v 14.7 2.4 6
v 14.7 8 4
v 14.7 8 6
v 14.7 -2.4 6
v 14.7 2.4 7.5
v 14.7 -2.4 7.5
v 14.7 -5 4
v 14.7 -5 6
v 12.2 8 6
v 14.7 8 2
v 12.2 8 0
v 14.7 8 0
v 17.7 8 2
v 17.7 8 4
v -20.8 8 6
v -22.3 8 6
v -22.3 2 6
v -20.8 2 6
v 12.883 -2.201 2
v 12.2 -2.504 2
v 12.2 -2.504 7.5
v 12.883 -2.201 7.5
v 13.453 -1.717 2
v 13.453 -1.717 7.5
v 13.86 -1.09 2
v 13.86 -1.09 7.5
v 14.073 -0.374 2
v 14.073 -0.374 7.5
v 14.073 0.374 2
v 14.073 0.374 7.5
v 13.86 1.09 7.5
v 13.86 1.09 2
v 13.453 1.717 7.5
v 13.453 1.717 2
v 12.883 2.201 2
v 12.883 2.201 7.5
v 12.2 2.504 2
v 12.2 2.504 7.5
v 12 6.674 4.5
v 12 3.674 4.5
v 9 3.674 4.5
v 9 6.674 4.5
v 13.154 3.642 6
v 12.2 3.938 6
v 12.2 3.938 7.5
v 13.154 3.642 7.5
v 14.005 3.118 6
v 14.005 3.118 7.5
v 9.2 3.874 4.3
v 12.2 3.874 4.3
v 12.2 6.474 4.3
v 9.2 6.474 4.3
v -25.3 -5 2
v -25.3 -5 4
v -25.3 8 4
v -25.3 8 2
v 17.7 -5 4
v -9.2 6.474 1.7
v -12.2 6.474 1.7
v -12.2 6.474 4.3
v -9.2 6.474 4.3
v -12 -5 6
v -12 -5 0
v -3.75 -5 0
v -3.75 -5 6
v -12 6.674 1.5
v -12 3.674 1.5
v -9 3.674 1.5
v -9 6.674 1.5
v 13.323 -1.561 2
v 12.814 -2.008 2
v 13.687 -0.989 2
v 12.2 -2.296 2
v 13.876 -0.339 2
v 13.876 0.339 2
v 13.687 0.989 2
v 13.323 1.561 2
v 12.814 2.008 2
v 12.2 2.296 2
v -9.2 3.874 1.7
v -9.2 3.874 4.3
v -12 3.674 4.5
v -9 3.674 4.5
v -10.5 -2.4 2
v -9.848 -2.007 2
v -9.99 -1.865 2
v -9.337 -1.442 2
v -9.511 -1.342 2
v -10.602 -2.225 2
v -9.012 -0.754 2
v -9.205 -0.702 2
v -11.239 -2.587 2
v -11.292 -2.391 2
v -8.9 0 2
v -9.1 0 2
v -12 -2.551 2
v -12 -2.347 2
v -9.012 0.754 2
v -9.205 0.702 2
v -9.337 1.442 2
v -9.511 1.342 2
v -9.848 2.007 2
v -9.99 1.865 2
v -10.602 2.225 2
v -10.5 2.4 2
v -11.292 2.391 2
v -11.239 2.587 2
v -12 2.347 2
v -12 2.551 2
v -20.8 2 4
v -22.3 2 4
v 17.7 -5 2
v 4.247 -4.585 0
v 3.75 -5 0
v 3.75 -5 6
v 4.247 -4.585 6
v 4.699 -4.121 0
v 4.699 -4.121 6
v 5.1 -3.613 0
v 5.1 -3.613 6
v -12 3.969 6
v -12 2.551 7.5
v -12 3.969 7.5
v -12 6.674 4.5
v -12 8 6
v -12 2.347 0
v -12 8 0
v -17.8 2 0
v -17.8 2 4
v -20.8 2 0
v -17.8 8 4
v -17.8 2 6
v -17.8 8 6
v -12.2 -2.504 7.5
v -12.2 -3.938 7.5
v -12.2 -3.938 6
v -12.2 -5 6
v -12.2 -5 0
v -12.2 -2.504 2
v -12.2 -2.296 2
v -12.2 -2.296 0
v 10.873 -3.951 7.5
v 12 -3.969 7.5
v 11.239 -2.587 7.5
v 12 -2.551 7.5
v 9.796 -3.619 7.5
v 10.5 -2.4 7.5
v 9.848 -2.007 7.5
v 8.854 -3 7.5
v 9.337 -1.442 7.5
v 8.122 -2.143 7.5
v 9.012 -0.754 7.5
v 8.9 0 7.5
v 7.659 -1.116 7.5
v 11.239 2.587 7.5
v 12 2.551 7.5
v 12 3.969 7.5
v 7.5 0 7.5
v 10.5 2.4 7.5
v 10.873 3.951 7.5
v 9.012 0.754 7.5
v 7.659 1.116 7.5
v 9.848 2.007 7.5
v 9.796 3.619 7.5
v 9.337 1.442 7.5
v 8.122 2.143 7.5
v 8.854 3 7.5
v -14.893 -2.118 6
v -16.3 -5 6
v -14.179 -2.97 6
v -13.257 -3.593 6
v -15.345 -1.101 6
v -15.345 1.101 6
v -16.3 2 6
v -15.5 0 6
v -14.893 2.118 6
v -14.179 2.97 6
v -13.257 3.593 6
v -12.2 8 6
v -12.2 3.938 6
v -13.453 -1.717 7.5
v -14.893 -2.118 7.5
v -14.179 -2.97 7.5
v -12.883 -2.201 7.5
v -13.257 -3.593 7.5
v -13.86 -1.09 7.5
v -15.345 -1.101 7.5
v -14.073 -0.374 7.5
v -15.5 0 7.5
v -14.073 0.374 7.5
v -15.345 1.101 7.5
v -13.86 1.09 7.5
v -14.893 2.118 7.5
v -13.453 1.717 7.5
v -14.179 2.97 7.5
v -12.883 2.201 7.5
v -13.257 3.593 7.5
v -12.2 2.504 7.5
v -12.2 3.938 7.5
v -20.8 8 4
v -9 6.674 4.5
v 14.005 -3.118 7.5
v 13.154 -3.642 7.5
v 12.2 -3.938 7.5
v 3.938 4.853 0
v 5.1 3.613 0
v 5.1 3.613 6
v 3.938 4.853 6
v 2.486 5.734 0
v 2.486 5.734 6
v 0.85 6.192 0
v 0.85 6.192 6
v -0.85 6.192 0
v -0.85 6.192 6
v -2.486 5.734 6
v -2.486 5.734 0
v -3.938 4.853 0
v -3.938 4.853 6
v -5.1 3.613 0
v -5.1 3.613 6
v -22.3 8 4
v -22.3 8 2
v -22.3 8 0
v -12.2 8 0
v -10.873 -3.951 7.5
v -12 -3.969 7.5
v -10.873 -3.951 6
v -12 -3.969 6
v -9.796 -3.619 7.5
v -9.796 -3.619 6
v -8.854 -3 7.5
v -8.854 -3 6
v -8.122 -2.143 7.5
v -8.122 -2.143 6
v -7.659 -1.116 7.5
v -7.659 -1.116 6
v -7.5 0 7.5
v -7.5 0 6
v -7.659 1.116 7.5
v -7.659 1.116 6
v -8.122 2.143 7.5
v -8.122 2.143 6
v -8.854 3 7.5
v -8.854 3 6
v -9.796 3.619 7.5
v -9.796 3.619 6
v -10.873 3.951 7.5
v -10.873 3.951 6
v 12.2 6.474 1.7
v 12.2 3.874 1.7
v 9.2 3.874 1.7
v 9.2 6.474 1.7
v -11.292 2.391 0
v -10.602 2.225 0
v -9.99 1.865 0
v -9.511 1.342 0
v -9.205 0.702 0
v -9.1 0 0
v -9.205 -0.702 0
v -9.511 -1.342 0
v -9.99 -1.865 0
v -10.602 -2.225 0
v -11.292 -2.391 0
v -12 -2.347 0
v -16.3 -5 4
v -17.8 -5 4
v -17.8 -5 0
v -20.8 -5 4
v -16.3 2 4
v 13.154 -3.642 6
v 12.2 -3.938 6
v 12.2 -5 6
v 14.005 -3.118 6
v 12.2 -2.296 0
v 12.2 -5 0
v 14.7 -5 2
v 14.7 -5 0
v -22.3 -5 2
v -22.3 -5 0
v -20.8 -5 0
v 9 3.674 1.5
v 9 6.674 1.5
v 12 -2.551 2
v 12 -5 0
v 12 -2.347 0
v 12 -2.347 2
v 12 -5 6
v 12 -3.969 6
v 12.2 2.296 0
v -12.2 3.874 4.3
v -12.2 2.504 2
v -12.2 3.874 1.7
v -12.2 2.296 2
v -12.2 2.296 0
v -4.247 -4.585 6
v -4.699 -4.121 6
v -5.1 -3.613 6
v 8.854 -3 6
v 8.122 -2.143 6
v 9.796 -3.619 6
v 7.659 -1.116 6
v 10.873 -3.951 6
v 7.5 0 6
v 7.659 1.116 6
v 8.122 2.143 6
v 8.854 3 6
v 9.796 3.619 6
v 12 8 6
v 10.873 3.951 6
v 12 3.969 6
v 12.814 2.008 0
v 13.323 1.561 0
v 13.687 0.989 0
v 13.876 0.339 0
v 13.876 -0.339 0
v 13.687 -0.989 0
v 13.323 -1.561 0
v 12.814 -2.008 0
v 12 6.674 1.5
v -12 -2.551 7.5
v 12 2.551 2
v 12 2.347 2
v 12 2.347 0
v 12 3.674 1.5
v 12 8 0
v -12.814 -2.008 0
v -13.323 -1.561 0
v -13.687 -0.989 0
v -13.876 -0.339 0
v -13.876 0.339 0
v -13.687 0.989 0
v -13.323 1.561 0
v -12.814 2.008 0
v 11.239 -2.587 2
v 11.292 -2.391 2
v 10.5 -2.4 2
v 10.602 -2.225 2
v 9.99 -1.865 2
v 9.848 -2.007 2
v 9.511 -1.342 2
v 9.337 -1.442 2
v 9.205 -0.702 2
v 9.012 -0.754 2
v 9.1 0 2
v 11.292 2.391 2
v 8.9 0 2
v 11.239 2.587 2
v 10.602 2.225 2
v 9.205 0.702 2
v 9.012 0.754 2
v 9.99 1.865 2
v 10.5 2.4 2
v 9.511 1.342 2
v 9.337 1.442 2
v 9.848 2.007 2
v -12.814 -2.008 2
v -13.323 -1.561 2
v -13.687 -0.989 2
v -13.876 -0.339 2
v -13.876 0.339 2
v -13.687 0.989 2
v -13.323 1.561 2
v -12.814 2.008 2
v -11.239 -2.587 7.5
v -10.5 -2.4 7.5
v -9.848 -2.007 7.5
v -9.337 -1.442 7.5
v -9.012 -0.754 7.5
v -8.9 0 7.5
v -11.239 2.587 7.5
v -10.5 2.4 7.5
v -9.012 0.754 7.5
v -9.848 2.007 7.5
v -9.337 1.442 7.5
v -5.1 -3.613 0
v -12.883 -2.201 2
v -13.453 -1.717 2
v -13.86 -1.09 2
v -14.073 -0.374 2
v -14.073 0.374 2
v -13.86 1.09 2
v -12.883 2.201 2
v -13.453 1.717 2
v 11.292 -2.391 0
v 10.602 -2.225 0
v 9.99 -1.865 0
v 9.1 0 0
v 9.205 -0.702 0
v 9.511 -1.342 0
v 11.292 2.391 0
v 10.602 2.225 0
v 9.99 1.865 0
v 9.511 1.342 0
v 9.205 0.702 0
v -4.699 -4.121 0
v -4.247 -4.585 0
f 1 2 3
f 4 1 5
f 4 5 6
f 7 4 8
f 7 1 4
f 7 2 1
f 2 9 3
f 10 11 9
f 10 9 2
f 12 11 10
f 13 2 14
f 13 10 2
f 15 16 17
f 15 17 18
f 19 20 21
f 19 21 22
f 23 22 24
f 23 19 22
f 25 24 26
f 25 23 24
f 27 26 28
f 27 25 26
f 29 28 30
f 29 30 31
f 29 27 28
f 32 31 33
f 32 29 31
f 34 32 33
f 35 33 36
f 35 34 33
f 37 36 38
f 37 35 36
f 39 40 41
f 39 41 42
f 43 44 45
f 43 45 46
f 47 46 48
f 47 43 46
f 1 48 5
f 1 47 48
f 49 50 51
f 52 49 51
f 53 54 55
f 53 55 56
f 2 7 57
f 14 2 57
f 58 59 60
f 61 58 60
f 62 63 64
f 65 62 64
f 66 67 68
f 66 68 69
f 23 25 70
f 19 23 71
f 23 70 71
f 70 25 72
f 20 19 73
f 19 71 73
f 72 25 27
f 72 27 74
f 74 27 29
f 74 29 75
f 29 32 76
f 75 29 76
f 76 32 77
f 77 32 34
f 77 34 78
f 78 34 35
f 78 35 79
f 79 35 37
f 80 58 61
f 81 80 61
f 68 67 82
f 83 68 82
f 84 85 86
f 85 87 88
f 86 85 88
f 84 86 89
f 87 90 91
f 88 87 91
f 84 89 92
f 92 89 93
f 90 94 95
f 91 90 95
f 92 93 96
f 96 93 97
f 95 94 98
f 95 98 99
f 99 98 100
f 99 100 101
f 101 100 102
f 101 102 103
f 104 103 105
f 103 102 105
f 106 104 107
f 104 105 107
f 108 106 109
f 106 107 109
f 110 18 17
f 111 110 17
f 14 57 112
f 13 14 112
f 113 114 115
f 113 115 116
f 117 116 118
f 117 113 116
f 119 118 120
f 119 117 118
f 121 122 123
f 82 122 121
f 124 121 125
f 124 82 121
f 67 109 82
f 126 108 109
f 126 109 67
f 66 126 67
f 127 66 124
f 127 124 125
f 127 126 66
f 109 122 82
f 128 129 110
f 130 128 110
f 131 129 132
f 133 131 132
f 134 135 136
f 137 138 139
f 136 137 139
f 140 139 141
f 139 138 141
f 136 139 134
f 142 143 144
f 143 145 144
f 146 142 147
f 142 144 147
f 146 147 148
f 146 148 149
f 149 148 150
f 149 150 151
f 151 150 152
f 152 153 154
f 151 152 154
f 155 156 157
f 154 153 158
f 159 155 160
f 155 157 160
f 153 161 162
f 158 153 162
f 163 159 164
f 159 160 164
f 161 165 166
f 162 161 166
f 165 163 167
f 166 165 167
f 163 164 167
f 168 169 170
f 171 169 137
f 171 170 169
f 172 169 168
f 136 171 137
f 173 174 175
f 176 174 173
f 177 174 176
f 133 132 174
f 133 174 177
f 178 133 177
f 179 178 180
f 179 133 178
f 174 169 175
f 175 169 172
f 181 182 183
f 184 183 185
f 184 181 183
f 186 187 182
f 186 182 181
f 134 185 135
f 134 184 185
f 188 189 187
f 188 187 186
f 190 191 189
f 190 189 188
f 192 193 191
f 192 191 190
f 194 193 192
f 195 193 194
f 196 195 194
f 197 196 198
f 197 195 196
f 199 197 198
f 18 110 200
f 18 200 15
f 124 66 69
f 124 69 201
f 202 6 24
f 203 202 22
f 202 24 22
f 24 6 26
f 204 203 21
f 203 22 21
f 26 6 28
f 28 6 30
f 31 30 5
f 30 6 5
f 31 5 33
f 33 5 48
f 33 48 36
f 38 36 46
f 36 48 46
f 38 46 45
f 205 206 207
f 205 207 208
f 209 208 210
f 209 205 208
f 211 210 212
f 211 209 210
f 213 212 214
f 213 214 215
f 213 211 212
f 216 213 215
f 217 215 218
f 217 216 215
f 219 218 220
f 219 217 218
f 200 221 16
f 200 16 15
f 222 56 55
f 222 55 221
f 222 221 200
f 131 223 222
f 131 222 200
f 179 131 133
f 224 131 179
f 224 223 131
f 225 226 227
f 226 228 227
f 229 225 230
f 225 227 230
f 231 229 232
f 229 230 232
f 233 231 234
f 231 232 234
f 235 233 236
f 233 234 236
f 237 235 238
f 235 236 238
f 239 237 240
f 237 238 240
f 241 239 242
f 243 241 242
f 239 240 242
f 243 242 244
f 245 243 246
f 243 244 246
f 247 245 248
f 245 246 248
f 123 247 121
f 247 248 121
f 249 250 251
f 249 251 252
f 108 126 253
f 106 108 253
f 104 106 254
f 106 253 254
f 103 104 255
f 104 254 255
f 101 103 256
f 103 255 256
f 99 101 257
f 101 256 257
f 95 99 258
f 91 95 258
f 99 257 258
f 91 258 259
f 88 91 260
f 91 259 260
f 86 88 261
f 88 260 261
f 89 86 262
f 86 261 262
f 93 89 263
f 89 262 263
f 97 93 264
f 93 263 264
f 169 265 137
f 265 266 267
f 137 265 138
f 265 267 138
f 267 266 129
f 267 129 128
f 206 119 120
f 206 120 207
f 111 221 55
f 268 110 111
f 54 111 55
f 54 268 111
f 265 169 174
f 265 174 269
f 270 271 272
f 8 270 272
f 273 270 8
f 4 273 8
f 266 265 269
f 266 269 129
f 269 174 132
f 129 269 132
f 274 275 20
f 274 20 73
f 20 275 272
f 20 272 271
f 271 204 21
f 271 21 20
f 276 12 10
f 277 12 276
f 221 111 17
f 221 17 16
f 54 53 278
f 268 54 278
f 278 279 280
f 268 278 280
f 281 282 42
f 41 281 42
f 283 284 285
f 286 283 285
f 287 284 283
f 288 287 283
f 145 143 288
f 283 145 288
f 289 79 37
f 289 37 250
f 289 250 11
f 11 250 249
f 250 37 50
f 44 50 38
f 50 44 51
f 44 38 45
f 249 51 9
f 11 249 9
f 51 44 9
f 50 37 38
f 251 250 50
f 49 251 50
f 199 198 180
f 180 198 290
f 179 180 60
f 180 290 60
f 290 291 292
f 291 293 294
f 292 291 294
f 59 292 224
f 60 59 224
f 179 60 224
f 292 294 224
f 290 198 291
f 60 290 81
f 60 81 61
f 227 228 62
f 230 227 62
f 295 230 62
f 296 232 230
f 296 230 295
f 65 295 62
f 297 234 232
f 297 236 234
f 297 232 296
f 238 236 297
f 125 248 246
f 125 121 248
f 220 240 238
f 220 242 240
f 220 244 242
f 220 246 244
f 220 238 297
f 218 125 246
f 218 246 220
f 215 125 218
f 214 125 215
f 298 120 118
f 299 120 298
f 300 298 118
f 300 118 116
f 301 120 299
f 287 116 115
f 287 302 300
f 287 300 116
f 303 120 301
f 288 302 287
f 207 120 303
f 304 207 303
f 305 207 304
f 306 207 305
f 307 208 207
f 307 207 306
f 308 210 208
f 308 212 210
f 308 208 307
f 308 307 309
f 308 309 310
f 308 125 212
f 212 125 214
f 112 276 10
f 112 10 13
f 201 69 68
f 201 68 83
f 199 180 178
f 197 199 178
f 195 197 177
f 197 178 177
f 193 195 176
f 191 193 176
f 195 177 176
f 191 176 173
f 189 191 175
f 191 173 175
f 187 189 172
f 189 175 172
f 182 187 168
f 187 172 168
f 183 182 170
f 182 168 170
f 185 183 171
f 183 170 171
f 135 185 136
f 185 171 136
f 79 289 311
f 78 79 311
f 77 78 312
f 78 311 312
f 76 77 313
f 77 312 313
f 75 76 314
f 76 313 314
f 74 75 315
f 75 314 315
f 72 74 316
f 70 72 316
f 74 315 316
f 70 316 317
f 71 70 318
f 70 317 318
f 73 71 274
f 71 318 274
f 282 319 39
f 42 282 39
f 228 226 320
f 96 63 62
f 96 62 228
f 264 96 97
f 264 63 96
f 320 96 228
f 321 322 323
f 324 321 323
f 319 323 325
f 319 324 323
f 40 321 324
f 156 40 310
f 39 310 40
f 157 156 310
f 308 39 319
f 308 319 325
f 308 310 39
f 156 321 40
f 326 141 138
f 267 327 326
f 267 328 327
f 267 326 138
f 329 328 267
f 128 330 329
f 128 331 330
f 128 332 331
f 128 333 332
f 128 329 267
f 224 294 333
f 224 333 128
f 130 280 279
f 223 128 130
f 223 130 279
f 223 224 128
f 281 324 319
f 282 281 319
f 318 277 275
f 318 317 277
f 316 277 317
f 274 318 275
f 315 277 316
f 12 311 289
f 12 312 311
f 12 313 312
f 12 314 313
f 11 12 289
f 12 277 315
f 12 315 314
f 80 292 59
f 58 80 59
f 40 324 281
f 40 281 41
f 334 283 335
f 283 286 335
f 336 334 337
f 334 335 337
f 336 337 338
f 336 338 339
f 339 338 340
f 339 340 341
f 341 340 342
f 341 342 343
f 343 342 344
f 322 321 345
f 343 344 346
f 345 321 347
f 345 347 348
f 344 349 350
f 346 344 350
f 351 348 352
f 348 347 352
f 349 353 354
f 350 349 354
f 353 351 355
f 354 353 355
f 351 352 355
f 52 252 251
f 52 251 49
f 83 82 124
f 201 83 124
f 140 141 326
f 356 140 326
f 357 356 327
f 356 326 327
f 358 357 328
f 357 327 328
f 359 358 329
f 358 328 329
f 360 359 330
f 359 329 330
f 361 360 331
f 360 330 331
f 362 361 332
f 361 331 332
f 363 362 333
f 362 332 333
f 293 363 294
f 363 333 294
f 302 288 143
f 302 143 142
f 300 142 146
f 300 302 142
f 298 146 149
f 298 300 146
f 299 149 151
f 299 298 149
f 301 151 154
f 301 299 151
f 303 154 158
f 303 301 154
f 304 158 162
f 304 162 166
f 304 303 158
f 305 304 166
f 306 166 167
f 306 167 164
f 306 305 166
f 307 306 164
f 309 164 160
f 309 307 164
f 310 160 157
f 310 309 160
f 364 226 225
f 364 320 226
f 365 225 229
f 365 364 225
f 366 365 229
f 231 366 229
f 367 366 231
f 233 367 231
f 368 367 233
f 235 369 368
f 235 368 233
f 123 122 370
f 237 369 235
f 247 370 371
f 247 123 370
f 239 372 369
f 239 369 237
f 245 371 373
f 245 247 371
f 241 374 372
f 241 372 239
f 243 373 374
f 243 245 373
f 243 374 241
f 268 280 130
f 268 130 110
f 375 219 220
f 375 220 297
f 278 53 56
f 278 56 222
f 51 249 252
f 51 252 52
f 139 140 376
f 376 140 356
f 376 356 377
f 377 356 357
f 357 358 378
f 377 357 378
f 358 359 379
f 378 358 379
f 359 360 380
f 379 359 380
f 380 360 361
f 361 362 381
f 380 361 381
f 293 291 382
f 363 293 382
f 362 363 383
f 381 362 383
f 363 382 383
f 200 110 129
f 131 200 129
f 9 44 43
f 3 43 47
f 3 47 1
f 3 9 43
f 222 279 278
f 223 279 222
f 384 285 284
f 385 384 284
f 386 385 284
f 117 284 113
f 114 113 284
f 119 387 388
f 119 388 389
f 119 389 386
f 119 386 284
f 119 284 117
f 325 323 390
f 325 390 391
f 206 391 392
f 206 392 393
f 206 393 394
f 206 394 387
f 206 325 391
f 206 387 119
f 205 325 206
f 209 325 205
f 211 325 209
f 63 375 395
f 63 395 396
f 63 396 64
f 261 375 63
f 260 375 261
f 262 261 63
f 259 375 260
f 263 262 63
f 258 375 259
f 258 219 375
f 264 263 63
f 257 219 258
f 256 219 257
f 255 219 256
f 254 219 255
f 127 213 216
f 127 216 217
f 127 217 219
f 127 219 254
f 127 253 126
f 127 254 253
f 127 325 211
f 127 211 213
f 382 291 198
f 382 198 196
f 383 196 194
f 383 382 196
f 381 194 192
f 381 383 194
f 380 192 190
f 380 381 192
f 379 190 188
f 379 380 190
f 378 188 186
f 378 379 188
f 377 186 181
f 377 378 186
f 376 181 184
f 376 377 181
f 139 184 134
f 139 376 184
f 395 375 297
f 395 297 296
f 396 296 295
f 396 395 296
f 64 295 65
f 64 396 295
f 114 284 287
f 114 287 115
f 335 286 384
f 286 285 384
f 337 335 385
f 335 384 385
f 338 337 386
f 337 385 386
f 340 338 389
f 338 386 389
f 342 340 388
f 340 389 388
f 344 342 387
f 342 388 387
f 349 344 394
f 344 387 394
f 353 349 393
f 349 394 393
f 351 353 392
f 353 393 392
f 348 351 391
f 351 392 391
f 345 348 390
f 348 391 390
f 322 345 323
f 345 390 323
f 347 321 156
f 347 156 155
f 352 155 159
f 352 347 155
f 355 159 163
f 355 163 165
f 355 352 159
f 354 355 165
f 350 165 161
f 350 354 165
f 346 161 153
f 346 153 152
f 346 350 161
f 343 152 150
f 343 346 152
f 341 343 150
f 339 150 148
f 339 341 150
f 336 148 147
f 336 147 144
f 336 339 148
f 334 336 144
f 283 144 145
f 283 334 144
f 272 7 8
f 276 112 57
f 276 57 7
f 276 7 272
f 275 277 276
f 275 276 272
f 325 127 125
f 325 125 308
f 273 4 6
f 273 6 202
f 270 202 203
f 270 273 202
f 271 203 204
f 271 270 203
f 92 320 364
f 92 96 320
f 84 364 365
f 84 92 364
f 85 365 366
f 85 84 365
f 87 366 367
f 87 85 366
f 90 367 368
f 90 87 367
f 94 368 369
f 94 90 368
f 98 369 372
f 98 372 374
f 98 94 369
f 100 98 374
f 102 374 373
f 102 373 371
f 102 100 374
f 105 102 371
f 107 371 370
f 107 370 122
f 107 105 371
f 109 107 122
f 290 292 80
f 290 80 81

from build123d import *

# Parameters (mm, degrees)
SKETCH1_R           = 1
BOSS_EXTRUDE1_DEPTH = 6
SKETCH2_R           = 2.6
CUT_EXTRUDE1_DEPTH  = 6
SKETCH3_W           = 7.6
SKETCH3_H           = 13
BOSS_EXTRUDE2_DEPTH = 6
BOSS_EXTRUDE5_START = -5
SKETCH6_W           = 3
SKETCH6_H           = 2
BOSS_EXTRUDE5_DEPTH = 13
SKETCH10_R          = 4
SKETCH10_R_2        = 2.6
BOSS_EXTRUDE6_DEPTH = 1.5
SKETCH12_R          = 2.6
SKETCH12_R_2        = 2.4
BOSS_EXTRUDE7_DEPTH = 2
CUT_EXTRUDE2_DEPTH  = 7
SKETCH14_W          = 3
SKETCH14_H          = 2
CUT_EXTRUDE3_DEPTH  = 7
SKETCH15_W          = 0.2
SKETCH15_H          = 13
CUT_EXTRUDE4_DEPTH  = 9.5
SKETCH16_W          = 3
SKETCH16_H          = 3
CUT_EXTRUDE5_DEPTH  = 3
BOSS_EXTRUDE8_START = 0.2
SKETCH16_3_W        = 2.6
SKETCH16_3_H        = 2.6
BOSS_EXTRUDE8_DEPTH = 3
BOSS_EXTRUDE9_START = -24.2
SKETCH16_4_W        = 2.6
SKETCH16_4_H        = 2.6
BOSS_EXTRUDE9_DEPTH = 3


with BuildPart() as part:
    # Sketch1 → Boss-Extrude1 (new body)
    with BuildSketch(Plane.XY):
        with BuildLine():
            ThreePointArc((3.75, -5), (4.47902769, -4.358991965), (5.1, -3.61282438))
            Line((5.1, -3.61282438), (5.1, 3.61282438))
            ThreePointArc((5.1, 3.61282438), (0, 6.25), (-5.1, 3.61282438))
            Line((-5.1, 3.61282438), (-5.1, -3.61282438))
            ThreePointArc((-5.1, -3.61282438), (-4.47902769, -4.358991965), (-3.75, -5))
            Line((-3.75, -5), (-14.7, -5))
            Line((-14.7, -5), (-14.7, 8))
            Line((-14.7, 8), (14.7, 8))
            Line((14.7, 8), (14.7, -5))
            Line((14.7, -5), (3.75, -5))
        make_face()
        with Locations((11.5, 0)):
            Circle(SKETCH1_R, mode=Mode.SUBTRACT)
        with Locations((-11.5, 0)):
            Circle(SKETCH1_R, mode=Mode.SUBTRACT)
    extrude(amount=BOSS_EXTRUDE1_DEPTH)

    # Sketch2 → Cut-Extrude1 (cut)
    with BuildSketch(Plane.XY):
        with Locations((-11.5, 0)):
            Circle(SKETCH2_R)
        with Locations((11.5, 0)):
            Circle(SKETCH2_R)
    extrude(amount=CUT_EXTRUDE1_DEPTH, mode=Mode.SUBTRACT)

    # Sketch3 → Boss-Extrude2 (add)
    with BuildSketch(Plane.XY):
        with Locations((-18.5, 1.5)):
            Rectangle(SKETCH3_W, SKETCH3_H)
    extrude(amount=BOSS_EXTRUDE2_DEPTH)

    # Sketch6 → Boss-Extrude5 (add)
    with BuildSketch(Plane(origin=(0, 0, 0), x_dir=(1, 0, 0), z_dir=(0, 1, 0)).offset(BOSS_EXTRUDE5_START)):
        with Locations((-23.8, -3)):
            Rectangle(SKETCH6_W, SKETCH6_H)
        with Locations((16.2, -3)):
            Rectangle(SKETCH6_W, SKETCH6_H)
    extrude(amount=BOSS_EXTRUDE5_DEPTH)

    # Sketch10 → Boss-Extrude6 (add)
    with BuildSketch(Plane.XY.offset(6)):
        with Locations((-11.5, 0)):
            Circle(SKETCH10_R)
        with Locations((-11.5, 0)):
            Circle(SKETCH10_R_2, mode=Mode.SUBTRACT)
        with BuildLine():
            Line((14.7, 2.4), (14.7, -2.4))
            ThreePointArc((14.7, -2.4), (7.5, 0), (14.7, 2.4))
        make_face()
        with Locations((11.5, 0)):
            Circle(SKETCH10_R_2, mode=Mode.SUBTRACT)
    extrude(amount=BOSS_EXTRUDE6_DEPTH)

    # Sketch12 → Boss-Extrude7 (add)
    with BuildSketch(Plane(origin=(0, 0, 0), x_dir=(-1, 0, 0), z_dir=(0, 0, -1))):
        with Locations((11.5, 0)):
            Circle(SKETCH12_R)
        with Locations((11.5, 0)):
            Circle(SKETCH12_R_2, mode=Mode.SUBTRACT)
        with Locations((-11.5, 0)):
            Circle(SKETCH12_R)
        with Locations((-11.5, 0)):
            Circle(SKETCH12_R_2, mode=Mode.SUBTRACT)
    extrude(amount=-BOSS_EXTRUDE7_DEPTH)

    # Sketch13 → Cut-Extrude2 (cut)
    with BuildSketch(Plane.XZ.offset(5)):
        Polygon((-22.3, 6), (-16.3, 6), (-16.3, 4), (-17.8, 4), (-17.8, 0), (-20.8, 0), (-20.8, 4), (-22.3, 4), align=None)
    extrude(amount=-CUT_EXTRUDE2_DEPTH, mode=Mode.SUBTRACT)

    # Sketch14 → Cut-Extrude3 (cut)
    with BuildSketch(Plane.XZ.offset(-2)):
        with Locations((-19.3, 5)):
            Rectangle(SKETCH14_W, SKETCH14_H)
    extrude(amount=-CUT_EXTRUDE3_DEPTH, mode=Mode.SUBTRACT)

    # Sketch15 → Cut-Extrude4 (cut, symmetric)
    with BuildSketch(Plane.XY):
        with Locations((-12.1, 1.5)):
            Rectangle(SKETCH15_W, SKETCH15_H)
        with Locations((12.1, 1.5)):
            Rectangle(SKETCH15_W, SKETCH15_H)
    extrude(amount=CUT_EXTRUDE4_DEPTH, both=True, mode=Mode.SUBTRACT)

    # Sketch16 → Cut-Extrude5 (cut)
    with BuildSketch(Plane.ZY.offset(12)):
        with Locations((3, 5.173669459)):
            Rectangle(SKETCH16_W, SKETCH16_H)
    cut_extrude5 = extrude(amount=-CUT_EXTRUDE5_DEPTH, mode=Mode.SUBTRACT)

    # Mirror1: Cut-Extrude5 across plane
    add(cut_extrude5.mirror(Plane(origin=(0, 0, 0), x_dir=(0, 0, 1), z_dir=(1, 0, 0))), mode=Mode.SUBTRACT)

    # Sketch16<3> → Boss-Extrude8 (add)
    with BuildSketch(Plane.ZY.offset(12).offset(BOSS_EXTRUDE8_START)):
        with Locations((3, 5.173669459)):
            Rectangle(SKETCH16_3_W, SKETCH16_3_H)
    extrude(amount=-BOSS_EXTRUDE8_DEPTH)

    # Sketch16<4> → Boss-Extrude9 (add)
    with BuildSketch(Plane.ZY.offset(12).offset(BOSS_EXTRUDE9_START)):
        with Locations((3, 5.173669459)):
            Rectangle(SKETCH16_4_W, SKETCH16_4_H)
    extrude(amount=BOSS_EXTRUDE9_DEPTH)


solid = part.part
